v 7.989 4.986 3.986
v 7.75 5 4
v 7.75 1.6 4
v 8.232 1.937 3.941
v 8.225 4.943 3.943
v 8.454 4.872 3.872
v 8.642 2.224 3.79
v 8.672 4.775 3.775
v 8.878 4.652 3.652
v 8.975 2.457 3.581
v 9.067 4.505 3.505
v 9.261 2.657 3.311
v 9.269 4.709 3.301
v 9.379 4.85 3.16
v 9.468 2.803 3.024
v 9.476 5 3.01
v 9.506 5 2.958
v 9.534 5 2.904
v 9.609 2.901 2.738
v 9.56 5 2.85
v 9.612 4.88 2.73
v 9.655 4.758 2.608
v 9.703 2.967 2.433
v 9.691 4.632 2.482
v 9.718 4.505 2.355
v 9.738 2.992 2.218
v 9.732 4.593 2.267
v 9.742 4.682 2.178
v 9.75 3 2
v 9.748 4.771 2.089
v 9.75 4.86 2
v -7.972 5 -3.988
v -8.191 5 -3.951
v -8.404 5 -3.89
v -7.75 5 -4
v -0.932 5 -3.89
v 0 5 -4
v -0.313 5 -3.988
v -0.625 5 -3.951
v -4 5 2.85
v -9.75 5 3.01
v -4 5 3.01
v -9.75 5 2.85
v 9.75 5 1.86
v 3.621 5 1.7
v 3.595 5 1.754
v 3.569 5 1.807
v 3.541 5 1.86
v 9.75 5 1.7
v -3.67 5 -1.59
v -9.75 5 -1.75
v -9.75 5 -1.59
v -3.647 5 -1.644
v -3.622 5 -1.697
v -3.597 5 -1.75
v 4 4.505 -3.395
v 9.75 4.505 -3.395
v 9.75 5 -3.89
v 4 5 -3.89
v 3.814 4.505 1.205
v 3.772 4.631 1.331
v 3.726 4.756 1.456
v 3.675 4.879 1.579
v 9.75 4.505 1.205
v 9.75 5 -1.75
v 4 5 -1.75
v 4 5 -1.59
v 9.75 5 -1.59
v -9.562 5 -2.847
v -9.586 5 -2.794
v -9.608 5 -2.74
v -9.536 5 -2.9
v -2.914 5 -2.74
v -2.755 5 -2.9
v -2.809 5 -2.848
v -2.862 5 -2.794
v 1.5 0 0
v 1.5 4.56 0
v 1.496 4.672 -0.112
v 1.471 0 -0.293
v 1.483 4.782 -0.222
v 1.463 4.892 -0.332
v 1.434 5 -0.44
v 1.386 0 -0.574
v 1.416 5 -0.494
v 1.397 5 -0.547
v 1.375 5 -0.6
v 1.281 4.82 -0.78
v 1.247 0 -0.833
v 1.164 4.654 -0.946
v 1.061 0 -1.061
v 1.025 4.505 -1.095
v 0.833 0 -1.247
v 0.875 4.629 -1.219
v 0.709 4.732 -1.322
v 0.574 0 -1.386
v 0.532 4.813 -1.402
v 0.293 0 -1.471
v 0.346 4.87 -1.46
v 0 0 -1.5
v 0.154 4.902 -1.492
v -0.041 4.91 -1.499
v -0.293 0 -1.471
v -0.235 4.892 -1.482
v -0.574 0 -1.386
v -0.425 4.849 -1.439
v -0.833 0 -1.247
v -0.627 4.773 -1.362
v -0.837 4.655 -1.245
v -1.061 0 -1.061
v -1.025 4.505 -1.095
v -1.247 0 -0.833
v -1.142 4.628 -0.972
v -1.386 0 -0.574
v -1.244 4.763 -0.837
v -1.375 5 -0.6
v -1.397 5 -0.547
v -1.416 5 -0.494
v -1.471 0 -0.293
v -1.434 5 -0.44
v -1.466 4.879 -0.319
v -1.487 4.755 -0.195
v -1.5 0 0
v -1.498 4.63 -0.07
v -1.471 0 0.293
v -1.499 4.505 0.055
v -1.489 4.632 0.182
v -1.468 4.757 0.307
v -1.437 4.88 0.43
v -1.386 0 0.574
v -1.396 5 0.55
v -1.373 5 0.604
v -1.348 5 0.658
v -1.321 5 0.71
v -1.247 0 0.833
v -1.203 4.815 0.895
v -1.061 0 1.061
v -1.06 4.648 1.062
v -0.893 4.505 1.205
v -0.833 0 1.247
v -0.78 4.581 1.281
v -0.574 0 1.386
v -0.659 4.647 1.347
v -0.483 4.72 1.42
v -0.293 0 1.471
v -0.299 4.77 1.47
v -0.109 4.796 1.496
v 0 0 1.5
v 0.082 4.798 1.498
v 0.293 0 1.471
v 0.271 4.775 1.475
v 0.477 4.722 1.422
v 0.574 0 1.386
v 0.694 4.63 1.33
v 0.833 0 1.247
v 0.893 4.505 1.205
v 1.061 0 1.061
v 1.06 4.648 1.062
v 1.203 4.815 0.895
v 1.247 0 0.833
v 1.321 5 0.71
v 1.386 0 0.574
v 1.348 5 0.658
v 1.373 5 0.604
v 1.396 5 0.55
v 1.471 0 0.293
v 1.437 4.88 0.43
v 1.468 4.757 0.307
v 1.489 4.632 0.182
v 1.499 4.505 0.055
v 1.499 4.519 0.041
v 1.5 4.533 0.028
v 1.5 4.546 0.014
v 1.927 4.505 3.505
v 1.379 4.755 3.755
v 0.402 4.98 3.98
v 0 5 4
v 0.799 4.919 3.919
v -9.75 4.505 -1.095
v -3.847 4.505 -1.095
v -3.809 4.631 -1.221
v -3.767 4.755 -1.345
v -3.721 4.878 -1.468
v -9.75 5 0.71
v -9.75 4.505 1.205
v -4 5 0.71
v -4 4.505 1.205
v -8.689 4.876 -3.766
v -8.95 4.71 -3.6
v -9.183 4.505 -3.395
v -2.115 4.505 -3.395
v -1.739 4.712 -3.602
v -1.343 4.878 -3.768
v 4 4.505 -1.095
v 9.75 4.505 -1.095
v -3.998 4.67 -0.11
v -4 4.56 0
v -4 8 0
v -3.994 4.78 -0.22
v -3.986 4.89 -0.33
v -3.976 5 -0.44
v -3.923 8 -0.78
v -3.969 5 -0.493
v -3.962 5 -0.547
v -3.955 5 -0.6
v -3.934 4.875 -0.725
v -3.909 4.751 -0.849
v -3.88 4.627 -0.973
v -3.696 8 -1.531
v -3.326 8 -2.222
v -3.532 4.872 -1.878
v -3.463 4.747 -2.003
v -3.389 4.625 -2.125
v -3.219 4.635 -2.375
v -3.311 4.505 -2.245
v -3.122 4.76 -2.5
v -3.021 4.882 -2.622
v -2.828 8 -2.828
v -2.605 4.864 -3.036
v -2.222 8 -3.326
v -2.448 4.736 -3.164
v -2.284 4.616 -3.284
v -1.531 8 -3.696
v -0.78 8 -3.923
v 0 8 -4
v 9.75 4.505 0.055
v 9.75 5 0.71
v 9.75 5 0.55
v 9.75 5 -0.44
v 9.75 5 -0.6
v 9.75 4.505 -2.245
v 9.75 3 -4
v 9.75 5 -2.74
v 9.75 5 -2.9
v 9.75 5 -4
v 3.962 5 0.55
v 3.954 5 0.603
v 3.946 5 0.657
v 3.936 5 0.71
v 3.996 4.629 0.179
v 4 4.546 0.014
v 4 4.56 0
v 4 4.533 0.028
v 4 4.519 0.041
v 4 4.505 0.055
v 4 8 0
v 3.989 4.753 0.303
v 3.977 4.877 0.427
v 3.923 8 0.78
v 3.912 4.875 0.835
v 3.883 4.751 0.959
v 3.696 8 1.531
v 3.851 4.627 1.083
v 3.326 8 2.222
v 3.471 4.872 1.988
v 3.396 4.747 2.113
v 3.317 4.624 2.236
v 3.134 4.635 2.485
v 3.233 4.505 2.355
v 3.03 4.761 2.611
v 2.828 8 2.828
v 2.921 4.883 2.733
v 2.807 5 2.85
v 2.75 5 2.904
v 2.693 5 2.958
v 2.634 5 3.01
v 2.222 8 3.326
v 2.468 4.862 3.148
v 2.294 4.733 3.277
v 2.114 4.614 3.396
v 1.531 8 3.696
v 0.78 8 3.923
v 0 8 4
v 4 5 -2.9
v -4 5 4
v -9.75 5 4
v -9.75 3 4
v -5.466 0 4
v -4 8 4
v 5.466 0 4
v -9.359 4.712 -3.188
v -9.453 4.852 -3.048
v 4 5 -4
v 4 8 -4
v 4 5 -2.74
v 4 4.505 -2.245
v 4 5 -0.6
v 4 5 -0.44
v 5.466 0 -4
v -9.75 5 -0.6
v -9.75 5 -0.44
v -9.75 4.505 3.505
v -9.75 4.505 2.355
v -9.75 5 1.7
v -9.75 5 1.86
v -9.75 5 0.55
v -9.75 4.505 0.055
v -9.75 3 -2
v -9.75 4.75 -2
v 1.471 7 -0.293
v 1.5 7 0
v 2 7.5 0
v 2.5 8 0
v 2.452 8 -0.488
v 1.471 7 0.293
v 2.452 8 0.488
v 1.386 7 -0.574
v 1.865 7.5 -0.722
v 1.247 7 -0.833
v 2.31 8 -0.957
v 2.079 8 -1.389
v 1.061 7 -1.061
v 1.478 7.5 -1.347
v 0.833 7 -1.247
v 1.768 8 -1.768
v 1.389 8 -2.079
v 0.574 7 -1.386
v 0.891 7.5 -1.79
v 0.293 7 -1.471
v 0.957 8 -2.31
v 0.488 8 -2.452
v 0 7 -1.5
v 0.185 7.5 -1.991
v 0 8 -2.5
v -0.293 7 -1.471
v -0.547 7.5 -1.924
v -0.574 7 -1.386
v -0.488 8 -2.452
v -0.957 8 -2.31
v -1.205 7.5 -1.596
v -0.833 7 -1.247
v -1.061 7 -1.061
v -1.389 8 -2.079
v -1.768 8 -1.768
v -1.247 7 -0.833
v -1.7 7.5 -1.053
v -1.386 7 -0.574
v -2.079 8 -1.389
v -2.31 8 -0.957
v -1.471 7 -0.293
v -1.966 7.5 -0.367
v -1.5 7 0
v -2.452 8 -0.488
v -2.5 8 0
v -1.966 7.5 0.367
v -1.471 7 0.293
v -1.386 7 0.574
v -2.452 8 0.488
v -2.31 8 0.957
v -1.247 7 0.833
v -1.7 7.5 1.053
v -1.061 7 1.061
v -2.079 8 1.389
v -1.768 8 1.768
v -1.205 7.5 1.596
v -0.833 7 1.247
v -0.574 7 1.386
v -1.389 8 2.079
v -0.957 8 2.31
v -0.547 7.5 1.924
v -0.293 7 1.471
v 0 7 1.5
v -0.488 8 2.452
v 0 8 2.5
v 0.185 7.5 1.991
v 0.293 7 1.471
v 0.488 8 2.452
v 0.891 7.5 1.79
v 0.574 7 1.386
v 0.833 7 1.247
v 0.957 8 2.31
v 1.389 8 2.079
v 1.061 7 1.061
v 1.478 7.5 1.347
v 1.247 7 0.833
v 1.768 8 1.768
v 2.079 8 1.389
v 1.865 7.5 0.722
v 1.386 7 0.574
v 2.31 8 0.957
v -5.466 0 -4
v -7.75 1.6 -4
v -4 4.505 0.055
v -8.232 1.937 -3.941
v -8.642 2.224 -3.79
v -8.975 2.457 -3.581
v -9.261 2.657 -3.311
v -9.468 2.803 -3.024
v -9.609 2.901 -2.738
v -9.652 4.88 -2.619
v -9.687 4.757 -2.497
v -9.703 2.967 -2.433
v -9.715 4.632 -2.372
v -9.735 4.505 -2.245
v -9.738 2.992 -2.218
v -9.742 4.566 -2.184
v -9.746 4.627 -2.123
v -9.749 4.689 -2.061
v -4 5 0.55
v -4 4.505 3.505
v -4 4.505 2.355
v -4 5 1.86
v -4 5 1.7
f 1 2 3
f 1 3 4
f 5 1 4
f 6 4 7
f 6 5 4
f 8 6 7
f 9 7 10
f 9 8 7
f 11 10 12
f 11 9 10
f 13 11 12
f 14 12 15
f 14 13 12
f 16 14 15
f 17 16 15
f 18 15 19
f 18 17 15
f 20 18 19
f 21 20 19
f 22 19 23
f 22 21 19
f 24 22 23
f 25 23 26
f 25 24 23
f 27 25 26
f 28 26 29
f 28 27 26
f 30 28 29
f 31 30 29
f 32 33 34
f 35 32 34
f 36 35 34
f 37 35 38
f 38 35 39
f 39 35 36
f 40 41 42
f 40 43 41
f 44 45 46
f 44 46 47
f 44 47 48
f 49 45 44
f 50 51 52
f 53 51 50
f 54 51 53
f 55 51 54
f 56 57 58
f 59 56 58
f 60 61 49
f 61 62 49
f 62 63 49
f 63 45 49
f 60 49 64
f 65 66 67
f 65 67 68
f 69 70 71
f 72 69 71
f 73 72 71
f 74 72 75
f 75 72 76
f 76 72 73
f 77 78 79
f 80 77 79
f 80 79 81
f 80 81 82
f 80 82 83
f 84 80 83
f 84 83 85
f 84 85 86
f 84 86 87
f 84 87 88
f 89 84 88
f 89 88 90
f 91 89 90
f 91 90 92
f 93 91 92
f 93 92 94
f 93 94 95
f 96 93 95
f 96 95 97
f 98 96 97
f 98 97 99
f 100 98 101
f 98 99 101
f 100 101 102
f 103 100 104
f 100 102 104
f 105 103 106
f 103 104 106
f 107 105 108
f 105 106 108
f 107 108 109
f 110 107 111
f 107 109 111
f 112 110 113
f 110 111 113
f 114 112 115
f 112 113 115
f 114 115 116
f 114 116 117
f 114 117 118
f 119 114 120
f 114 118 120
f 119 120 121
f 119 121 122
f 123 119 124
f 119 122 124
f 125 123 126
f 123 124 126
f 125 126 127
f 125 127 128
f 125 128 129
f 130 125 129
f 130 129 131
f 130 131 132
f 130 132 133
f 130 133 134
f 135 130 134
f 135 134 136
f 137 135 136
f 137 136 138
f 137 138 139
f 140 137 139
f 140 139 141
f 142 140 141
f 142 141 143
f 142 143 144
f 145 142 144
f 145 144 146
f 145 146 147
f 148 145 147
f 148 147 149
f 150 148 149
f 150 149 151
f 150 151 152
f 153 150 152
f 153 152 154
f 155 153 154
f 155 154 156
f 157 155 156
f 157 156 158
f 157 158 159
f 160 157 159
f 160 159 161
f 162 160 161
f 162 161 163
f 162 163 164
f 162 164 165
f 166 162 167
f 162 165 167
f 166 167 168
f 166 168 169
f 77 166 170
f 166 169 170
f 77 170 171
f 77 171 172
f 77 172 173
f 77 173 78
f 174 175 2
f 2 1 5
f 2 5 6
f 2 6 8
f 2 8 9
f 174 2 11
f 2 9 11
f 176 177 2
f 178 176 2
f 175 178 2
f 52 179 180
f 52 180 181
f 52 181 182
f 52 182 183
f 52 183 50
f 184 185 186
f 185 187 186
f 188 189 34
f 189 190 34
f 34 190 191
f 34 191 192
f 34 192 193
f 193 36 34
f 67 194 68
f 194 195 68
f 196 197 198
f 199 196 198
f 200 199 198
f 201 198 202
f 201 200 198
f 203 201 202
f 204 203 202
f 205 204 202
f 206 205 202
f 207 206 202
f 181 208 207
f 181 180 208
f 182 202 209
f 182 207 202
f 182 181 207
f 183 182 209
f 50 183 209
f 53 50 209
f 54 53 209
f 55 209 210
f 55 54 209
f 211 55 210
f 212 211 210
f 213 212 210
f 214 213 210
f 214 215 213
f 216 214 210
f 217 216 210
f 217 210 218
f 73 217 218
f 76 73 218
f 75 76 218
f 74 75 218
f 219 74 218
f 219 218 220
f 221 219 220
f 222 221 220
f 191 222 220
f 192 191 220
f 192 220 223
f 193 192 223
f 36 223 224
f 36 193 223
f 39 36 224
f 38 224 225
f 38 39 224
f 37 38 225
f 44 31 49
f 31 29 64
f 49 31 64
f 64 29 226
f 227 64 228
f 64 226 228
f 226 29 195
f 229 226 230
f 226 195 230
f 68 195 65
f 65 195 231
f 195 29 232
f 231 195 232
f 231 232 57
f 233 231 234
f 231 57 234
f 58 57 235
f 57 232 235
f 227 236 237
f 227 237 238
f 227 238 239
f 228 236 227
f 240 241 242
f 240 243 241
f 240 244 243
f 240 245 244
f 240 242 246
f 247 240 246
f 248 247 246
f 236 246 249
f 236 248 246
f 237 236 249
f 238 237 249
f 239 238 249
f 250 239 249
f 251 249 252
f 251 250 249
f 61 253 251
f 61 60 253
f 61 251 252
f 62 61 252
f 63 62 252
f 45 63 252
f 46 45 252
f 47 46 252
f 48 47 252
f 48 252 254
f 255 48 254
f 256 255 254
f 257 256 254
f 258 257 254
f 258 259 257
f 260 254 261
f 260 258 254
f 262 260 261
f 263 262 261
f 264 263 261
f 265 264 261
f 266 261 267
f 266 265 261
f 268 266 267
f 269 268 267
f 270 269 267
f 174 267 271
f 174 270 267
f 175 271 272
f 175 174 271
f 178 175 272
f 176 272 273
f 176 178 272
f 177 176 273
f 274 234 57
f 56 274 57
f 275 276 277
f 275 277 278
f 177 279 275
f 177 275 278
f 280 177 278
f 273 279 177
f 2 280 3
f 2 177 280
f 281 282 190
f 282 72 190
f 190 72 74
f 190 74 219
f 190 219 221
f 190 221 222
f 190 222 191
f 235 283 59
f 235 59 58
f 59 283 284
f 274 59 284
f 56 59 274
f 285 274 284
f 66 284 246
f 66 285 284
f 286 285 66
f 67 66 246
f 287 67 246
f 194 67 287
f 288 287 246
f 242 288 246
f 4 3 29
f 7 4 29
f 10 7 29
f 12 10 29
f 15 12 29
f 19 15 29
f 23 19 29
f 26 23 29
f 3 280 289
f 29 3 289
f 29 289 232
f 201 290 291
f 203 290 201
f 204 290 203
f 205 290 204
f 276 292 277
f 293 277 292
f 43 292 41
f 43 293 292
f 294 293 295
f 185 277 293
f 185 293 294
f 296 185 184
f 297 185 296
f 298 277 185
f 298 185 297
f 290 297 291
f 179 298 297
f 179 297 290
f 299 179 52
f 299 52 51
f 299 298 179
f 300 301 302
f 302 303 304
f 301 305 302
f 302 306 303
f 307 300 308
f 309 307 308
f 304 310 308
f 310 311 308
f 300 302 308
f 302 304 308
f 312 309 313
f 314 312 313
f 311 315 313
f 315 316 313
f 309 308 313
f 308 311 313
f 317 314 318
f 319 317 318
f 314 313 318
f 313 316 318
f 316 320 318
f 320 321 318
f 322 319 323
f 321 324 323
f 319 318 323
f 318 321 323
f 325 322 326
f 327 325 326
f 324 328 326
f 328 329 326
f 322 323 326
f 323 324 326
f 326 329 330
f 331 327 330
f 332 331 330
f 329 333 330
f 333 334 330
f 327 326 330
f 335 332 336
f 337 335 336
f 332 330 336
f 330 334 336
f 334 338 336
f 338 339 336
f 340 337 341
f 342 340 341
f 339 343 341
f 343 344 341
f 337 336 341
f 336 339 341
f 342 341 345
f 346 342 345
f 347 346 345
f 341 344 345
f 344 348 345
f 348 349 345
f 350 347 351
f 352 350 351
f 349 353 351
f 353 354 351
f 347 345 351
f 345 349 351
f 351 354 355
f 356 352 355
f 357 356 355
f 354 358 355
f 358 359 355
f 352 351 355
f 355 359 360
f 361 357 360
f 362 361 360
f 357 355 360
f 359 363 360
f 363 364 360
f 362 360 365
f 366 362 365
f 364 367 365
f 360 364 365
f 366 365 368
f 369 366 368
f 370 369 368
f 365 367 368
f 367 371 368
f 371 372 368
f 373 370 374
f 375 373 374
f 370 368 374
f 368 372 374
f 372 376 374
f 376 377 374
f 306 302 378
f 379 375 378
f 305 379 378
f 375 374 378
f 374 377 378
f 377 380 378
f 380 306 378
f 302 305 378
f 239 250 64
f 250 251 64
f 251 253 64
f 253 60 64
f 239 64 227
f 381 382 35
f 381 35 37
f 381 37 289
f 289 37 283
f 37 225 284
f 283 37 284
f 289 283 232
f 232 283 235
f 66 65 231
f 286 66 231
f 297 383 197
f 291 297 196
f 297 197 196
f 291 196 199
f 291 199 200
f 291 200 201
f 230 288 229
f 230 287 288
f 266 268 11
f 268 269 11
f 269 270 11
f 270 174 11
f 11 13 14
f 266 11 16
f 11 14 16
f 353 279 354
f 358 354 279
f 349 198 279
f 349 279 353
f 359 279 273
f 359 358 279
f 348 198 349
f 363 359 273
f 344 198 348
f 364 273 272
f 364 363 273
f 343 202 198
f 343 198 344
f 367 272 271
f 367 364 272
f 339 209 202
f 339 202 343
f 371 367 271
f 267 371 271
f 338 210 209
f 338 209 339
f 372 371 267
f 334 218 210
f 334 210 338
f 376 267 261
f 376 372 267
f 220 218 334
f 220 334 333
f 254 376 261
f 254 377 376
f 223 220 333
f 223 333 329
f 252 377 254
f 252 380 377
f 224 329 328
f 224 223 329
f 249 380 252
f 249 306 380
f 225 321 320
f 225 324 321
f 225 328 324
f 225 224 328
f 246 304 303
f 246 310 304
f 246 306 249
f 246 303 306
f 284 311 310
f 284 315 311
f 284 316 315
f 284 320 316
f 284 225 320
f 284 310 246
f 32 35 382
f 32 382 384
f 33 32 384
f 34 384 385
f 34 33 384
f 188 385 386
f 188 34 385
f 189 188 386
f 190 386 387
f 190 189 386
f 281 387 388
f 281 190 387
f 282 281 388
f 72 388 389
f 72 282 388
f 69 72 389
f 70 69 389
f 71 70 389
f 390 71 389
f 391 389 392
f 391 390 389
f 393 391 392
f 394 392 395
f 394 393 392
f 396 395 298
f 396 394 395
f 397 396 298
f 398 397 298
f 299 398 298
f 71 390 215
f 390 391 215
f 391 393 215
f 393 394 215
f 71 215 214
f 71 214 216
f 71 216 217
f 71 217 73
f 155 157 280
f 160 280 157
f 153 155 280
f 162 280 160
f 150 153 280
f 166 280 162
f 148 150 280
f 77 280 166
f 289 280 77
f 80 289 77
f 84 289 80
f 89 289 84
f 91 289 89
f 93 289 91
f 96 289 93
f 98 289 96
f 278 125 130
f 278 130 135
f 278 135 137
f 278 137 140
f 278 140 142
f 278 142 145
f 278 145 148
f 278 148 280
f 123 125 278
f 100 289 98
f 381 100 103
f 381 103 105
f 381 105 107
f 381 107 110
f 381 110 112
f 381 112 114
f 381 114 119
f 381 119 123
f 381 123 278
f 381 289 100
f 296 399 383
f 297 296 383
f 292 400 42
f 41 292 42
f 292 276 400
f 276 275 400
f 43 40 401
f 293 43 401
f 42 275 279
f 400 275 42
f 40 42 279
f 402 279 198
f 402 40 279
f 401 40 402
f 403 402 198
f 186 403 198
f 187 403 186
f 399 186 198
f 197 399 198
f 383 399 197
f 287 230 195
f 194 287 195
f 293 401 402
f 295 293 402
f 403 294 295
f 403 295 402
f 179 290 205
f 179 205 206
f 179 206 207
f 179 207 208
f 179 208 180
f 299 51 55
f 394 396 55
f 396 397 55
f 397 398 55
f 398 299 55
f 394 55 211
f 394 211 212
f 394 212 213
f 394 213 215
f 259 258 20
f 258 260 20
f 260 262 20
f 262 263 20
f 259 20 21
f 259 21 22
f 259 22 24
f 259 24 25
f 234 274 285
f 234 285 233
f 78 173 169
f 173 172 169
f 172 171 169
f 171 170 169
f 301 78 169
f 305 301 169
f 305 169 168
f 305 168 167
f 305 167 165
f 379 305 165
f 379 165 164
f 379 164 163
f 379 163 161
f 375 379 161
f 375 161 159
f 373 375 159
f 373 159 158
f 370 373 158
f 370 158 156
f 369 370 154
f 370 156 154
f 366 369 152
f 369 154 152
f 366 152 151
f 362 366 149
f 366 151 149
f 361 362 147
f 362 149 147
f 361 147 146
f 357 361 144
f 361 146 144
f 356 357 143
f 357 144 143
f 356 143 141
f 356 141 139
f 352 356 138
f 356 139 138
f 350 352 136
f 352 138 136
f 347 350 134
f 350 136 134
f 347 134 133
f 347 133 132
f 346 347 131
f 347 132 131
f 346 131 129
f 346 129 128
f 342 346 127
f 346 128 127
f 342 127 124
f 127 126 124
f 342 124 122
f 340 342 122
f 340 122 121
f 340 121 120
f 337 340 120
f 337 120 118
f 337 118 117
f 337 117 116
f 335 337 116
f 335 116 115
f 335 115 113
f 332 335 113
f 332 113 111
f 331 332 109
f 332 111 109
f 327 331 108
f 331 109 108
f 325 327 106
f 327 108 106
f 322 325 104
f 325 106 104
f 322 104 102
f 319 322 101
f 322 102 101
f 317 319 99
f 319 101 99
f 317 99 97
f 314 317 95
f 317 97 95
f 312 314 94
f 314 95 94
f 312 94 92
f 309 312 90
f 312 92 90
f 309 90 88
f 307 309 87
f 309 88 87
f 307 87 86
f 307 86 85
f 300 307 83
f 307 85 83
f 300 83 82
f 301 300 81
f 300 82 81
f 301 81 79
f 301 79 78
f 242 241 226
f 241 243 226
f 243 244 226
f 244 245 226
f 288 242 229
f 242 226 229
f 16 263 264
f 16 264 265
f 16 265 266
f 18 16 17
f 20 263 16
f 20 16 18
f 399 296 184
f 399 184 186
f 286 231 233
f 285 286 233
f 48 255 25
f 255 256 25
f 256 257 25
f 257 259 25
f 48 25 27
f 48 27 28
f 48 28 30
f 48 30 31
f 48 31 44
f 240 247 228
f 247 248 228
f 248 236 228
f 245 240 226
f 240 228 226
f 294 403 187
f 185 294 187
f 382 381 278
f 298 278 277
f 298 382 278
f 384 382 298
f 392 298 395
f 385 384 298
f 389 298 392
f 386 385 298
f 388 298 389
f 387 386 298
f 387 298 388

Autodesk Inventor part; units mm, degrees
ref_plane "YZ Plane" through (0, 0, 0) normal (1, 0, 0) x (0, 1, 0)
ref_plane "XZ Plane" through (0, 0, 0) normal (0, 1, 0) x (-1, 0, 0)
ref_plane "XY Plane" through (0, 0, 0) normal (0, 0, 1) x (1, 0, 0)
sketch "Skizze3" plane through (0, 0, 0) normal (0, 0, 1) x (1, 0, 0)
  line L0 (0, 0) -> (5.4656, 0)
  line L1 (5.4656, 0) -> (9.75, 3)
  line L2 (9.75, 3) -> (9.75, 5)
  line L3 (9.75, 5) -> (0, 5)
  line L4 (0, 6) -> (0, -1) construction
  line L5 (0, 0) -> (-5.4656, 0)
  line L6 (-5.4656, 0) -> (-9.75, 3)
  line L7 (-9.75, 3) -> (-9.75, 5)
  line L8 (-9.75, 5) -> (0, 5)
  dimension "d6" = 9.75
  dimension "d8" = 5
  dimension "d9" = 3
  dimension "d10" = 145
extrude "Extrusion2" add sketch "Skizze3" along normal mid plane 8
sketch "Skizze4" plane through (-9.75, 5, 4) normal (0, 1, 0) x (1, 0, 0)
  line L0 (0, 8) -> (0, 0) projected
  line L1 (19.5, 0) -> (0, 0) projected
  line L2 (19.5, 8) -> (19.5, 0) projected
  line L3 (0, 8) -> (19.5, 8) projected
  circle A0 centre (9.75, 4) radius 1.5
  line L4 (5.75, 8) -> (13.75, 8)
  line L5 (13.75, 8) -> (13.75, 0)
  line L6 (13.75, 0) -> (5.75, 0)
  line L7 (5.75, 0) -> (5.75, 8)
  line L8 (5.75, 8) -> (13.75, 0) construction
  line L9 (13.75, 8) -> (5.75, 0) construction
  line L10 (0, 8) -> (19.5, 8) projected
  arc A1 (9.75, 8) -> (5.75, 4) centre (9.75, 4) ccw
  arc A2 (9.75, 0) -> (13.75, 4) centre (9.75, 4) ccw
  point P0 (9.75, 0)
  dimension "d13" = 3
  dimension "d14" = 8
  dimension "d15" = 8
extrude "Extrusion3" add sketch "Skizze4" along normal blind 3 and the other way blind 5 separate body contours L7 A1 L3 L5 A2 L1
sketch "Skizze5" plane through (9.75, 3, 4) normal (1, 0, 0) x (0, 0, -1)
  line L0 (8, 2) -> (0, 2) projected
  line L1 (0, 0) -> (0, 2) projected
  line L2 (8, 0) -> (0, 0) projected
  line L3 (8, 2) -> (8, 0) projected
  line L4 (0, 0) -> (0, 2) projected
  line L5 (0, 2) -> (0.495, 1.505)
  line L6 (0.495, 1.505) -> (0.9899, 2)
  line L7 (8, 2) -> (0, 2) projected
  line L8 (1.15, 2) -> (1.645, 1.505)
  line L9 (1.645, 1.505) -> (2.1399, 2)
  line L10 (2.3, 2) -> (2.795, 1.505)
  line L11 (2.795, 1.505) -> (3.2899, 2)
  line L12 (3.45, 2) -> (3.945, 1.505)
  line L13 (3.945, 1.505) -> (4.4399, 2)
  line L14 (4.6, 2) -> (5.095, 1.505)
  line L15 (5.095, 1.505) -> (5.5899, 2)
  line L16 (5.75, 2) -> (6.245, 1.505)
  line L17 (6.245, 1.505) -> (6.7399, 2)
  line L18 (6.9, 2) -> (7.395, 1.505)
  line L19 (7.395, 1.505) -> (7.8899, 2)
  point P0 (4, -3)
  dimension "d21" = 0.7
  dimension "d24" = 1.15
extrude "Extrusion4" cut sketch "Skizze5" against normal up to surface (19.5 mm away) contours L19 L18 L0 | L17 L16 L0 | L0 L6 L5 | L15 L14 L0 | L0 L9 L8 | L13 L12 L0 | L0 L11 L10 bodies 1
extrude "Extrusion5" cut sketch "Skizze4" against normal blind 10 contours A0 bodies 1
chamfer "Fase2" distance 1 angle 45 1 edges at (-1.5, 8, 0)
combine bodies "Kombinieren1" operation type add bodies to combine 1 2
fillet "Rundung1" radius 2 2 edges at (9.75, 4, 4) (-9.75, 4, -4)
properties part number "T-NUT - DropIn 4040 SERIES - M3"
